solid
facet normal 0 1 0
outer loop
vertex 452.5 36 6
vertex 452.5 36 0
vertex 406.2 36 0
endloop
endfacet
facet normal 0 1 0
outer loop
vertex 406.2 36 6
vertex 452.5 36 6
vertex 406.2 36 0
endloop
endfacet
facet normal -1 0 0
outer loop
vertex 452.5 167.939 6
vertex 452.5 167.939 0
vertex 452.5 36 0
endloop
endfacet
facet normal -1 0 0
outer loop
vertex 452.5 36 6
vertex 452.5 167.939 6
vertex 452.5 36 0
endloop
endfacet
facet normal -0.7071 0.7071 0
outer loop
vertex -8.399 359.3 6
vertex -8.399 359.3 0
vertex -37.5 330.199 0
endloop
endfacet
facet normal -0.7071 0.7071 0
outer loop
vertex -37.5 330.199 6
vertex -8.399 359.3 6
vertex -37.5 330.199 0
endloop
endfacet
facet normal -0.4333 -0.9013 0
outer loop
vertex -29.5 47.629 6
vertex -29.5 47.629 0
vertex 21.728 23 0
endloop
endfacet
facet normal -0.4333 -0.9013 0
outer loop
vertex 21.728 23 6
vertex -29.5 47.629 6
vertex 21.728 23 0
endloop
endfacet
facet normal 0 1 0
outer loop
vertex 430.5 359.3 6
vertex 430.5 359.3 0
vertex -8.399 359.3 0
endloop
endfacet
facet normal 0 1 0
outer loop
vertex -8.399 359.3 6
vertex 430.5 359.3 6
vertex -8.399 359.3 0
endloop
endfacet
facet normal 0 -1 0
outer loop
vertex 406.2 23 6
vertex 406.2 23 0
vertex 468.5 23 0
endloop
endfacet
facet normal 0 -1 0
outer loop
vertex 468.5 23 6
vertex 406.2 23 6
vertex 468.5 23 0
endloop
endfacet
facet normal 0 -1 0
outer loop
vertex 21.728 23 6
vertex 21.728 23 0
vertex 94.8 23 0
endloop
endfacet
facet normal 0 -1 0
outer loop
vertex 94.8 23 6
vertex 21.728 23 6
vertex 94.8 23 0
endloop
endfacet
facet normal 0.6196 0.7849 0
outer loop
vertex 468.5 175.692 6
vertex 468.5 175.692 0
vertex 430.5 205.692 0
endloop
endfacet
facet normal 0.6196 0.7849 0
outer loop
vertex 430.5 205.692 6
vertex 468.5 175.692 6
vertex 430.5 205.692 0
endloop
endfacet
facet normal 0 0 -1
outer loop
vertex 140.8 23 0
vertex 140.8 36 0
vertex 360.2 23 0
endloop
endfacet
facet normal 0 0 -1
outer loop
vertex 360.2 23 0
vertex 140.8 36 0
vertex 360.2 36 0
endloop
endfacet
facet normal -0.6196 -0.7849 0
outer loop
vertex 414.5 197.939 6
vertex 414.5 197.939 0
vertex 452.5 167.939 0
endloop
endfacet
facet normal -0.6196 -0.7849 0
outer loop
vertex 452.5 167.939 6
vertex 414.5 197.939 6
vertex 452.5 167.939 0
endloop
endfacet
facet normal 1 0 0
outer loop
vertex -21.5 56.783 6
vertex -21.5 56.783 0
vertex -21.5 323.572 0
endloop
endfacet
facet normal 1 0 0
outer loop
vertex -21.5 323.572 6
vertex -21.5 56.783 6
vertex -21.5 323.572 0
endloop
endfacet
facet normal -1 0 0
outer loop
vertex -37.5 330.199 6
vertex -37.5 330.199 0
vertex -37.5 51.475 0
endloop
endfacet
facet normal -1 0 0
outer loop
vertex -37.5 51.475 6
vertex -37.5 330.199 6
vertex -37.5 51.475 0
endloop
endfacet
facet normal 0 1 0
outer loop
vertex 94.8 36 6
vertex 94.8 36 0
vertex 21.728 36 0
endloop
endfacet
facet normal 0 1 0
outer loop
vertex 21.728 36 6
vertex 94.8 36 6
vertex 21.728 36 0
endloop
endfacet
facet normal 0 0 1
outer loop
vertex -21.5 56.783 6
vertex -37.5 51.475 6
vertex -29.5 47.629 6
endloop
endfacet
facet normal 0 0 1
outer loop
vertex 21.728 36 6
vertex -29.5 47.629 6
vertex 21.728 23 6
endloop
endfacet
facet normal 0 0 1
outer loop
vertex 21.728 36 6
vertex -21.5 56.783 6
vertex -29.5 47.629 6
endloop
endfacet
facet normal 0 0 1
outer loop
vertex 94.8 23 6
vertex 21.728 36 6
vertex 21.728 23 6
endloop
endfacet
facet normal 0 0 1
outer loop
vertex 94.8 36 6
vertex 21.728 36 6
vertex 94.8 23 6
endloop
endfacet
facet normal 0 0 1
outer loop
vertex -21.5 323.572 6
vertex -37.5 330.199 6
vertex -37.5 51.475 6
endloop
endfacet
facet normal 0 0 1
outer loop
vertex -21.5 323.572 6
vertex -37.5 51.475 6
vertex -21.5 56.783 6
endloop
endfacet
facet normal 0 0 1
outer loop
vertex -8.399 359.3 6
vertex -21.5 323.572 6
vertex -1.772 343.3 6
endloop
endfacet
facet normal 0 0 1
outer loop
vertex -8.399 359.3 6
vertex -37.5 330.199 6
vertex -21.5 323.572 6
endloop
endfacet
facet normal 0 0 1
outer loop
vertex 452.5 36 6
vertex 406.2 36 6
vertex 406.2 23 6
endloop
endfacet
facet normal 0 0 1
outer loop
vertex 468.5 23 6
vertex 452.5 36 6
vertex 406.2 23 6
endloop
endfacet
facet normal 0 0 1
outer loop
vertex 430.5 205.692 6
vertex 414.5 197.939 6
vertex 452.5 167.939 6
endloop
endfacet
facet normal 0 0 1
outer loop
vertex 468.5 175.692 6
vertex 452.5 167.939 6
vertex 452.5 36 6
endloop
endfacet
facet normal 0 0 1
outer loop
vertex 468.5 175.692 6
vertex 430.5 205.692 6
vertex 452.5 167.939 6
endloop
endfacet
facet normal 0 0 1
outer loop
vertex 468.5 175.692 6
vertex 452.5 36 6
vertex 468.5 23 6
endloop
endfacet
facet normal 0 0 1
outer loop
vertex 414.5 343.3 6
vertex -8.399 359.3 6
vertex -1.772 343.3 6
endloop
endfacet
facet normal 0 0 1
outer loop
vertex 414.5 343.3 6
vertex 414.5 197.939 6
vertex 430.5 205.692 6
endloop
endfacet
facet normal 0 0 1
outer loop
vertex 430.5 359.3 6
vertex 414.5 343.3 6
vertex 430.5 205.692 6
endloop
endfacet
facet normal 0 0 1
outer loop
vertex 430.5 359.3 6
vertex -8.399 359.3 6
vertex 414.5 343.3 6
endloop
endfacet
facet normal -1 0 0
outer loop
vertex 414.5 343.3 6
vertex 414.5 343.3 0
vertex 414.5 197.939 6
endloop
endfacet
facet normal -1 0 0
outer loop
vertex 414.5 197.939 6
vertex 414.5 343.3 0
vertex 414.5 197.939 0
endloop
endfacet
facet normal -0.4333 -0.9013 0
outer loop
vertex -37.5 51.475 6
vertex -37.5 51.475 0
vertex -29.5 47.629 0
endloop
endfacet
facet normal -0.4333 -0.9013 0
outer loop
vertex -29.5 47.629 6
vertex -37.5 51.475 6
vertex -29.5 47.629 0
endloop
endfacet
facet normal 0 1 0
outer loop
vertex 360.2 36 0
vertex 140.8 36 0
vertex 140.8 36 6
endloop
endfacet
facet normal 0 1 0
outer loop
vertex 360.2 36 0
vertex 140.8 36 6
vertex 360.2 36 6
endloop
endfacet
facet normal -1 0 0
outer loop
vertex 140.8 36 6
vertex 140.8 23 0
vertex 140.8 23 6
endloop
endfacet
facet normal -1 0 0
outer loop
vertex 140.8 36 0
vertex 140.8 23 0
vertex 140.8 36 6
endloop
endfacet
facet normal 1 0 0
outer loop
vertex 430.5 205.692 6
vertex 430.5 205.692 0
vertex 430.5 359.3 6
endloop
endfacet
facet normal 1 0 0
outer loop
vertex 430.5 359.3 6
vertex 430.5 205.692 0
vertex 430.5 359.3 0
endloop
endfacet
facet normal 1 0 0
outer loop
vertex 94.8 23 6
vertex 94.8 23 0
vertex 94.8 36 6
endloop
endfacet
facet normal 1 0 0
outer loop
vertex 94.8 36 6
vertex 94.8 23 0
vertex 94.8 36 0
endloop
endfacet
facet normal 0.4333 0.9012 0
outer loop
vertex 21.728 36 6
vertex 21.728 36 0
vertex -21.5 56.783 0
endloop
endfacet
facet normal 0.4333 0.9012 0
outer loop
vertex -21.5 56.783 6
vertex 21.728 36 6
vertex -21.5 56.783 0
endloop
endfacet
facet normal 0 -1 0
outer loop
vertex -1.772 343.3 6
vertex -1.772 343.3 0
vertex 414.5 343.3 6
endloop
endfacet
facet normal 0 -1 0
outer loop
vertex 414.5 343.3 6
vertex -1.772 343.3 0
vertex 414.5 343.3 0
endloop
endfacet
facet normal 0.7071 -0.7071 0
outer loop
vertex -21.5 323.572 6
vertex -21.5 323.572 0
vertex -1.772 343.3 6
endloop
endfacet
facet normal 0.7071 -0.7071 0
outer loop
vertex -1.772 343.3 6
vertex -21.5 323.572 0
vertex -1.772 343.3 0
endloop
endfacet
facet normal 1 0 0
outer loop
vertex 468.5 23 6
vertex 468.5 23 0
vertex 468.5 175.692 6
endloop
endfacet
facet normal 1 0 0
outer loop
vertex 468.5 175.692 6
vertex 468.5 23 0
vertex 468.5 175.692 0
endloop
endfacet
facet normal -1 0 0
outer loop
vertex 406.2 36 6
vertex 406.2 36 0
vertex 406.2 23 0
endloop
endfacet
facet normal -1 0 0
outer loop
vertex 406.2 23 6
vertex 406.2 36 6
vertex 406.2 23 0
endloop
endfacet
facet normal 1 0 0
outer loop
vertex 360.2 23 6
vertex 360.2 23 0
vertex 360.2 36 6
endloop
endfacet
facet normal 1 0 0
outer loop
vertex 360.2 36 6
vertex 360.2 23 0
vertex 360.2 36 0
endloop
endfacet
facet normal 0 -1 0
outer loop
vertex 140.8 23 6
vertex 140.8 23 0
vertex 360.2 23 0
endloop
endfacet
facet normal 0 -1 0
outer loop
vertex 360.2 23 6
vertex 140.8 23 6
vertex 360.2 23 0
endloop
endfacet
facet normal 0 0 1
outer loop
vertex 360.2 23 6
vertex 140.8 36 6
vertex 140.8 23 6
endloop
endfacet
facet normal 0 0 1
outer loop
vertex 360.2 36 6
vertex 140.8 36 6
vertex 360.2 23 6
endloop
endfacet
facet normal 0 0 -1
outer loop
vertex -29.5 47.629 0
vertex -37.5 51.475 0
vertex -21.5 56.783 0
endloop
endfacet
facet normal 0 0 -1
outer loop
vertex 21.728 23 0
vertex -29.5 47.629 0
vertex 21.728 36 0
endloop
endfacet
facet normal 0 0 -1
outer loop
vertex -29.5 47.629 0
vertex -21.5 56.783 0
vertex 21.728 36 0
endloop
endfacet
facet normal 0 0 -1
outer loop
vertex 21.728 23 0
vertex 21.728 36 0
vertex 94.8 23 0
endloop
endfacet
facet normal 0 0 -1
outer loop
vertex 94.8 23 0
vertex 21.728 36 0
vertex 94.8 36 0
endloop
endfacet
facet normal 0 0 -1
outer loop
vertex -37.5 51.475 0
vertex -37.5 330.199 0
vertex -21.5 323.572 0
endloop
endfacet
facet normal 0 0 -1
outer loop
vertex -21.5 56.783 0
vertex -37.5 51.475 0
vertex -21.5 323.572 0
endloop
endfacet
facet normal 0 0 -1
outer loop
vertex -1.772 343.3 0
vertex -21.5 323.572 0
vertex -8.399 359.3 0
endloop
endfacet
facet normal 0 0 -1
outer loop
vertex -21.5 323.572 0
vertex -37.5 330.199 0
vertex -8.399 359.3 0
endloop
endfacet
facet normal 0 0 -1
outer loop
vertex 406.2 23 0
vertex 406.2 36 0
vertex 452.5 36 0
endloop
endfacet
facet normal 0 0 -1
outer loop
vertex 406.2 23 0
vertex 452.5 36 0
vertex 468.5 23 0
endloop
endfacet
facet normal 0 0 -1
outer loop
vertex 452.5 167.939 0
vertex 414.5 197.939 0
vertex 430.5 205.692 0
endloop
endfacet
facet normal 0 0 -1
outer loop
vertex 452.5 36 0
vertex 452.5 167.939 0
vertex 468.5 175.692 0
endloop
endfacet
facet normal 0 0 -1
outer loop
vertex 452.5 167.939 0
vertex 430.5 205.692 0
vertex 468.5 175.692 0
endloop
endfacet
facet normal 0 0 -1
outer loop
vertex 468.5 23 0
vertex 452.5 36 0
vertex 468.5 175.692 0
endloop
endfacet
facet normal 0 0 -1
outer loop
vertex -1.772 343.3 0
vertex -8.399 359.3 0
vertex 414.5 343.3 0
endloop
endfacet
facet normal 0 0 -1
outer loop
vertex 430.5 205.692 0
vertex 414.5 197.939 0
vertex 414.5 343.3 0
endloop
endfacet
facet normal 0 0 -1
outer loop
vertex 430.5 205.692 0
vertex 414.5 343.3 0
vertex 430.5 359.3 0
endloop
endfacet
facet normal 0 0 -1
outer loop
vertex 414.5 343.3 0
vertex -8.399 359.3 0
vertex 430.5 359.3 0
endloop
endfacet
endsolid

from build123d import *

# Parameters (mm, degrees)
BOSS_EXTRU_1_DEPTH   = 6
ESQUISSE1_W          = 219.4
ESQUISSE1_H          = 13
BOSS_EXTRU_1_2_DEPTH = 6


with BuildPart() as part:
    # Esquisse1 → Boss.-Extru.1 (new body)
    with BuildSketch(Plane.XY):
        Polygon((468.5, 23), (468.5, 175.692213585), (430.5, 205.692213585), (430.5, 359.3), (-8.399494937, 359.3), (-37.5, 330.199494937), (-37.5, 51.474951672), (-29.5, 47.628797826), (21.727899478, 23), (94.8, 23), (94.8, 36), (21.727899478, 36), (-21.5, 56.78264398), (-21.5, 323.572077939), (-1.772077939, 343.3), (414.5, 343.3), (414.5, 197.938582533), (452.5, 167.938582533), (452.5, 36), (406.2, 36), (406.2, 23), (460.5, 23), align=None)
    extrude(amount=BOSS_EXTRU_1_DEPTH)


with BuildPart() as body_2:
    # Esquisse1 → Boss.-Extru.1 2 (new body)
    with BuildSketch(Plane.XY):
        with Locations((250.5, 29.5)):
            Rectangle(ESQUISSE1_W, ESQUISSE1_H)
    extrude(amount=BOSS_EXTRU_1_2_DEPTH)


solid = Compound([part.part, body_2.part])
